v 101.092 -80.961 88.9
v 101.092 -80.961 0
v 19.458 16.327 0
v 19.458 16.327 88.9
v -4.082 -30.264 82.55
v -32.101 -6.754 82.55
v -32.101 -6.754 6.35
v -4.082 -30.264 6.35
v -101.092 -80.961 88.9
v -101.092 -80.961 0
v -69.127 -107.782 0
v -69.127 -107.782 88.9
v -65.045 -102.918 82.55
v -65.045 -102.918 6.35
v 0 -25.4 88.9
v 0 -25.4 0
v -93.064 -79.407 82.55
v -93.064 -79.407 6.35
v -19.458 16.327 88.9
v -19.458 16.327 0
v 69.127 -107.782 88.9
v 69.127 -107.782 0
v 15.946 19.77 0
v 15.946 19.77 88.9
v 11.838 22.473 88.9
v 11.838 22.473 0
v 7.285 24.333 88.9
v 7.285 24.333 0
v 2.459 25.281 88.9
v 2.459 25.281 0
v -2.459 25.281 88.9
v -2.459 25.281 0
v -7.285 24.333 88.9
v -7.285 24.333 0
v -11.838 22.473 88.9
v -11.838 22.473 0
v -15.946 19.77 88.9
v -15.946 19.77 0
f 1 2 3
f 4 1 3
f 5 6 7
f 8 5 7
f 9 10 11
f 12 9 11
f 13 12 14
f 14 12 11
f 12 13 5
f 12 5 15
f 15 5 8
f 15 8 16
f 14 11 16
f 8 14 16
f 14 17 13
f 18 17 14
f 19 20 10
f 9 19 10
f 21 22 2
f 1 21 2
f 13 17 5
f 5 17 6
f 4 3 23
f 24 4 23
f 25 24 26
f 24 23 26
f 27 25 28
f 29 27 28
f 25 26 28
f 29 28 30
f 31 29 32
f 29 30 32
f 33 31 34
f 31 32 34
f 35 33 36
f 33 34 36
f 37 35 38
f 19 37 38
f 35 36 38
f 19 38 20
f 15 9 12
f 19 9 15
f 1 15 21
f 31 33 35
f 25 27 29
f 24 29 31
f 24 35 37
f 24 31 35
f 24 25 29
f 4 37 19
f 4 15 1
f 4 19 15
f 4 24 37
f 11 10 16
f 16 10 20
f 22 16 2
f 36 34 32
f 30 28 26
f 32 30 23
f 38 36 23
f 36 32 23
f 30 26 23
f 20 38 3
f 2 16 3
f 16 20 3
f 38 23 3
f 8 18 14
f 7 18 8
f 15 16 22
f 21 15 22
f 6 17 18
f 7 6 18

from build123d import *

# Parameters (mm, degrees)
BOSS_EXTRUDE1_DEPTH     = 88.9
CUT_EXTRUDE1_DEPTH      = 3.048
CUT_EXTRUDE1_DEPTH_BACK = 36.576
SKETCH3_W               = 76.2
SKETCH3_H               = 94.842471145


with BuildPart() as part:
    # Sketch1 → Boss-Extrude1 (new body)
    with BuildSketch(Plane.XY):
        with BuildLine():
            ThreePointArc((25.4, 0), (17.960512242, -17.960512242), (0, -25.4))
            Line((0, -25.4), (69.126967967, -107.78231242))
            Line((69.126967967, -107.78231242), (101.091555285, -80.96083899))
            Line((101.091555285, -80.96083899), (19.457528855, 16.326805286))
            ThreePointArc((19.457528855, 16.326805286), (23.868192568, 8.68731164), (25.4, 0))
        make_face()
        with BuildLine():
            ThreePointArc((19.457528855, 16.326805286), (0, 25.4), (-19.457528855, 16.326805286))
            Line((-19.457528855, 16.326805286), (0, 0))
            Line((0, 0), (19.457528855, 16.326805286))
        make_face()
        with BuildLine():
            Line((12.507058463, -10.494668144), (0, -25.4))
            ThreePointArc((0, -25.4), (17.960512242, -17.960512242), (25.4, 0))
            ThreePointArc((25.4, 0), (23.868192568, 8.68731164), (19.457528855, 16.326805286))
            Line((19.457528855, 16.326805286), (0, 0))
            Line((0, 0), (12.507058463, -10.494668144))
        make_face()
        Polygon((-12.507058463, -10.494668144), (0, -25.4), (12.507058463, -10.494668144), (0, 0), align=None)
        with BuildLine():
            ThreePointArc((-19.457528855, 16.326805286), (-23.020217791, -10.734503848), (0, -25.4))
            Line((0, -25.4), (-12.507058463, -10.494668144))
            Line((-12.507058463, -10.494668144), (0, 0))
            Line((0, 0), (-19.457528855, 16.326805286))
        make_face()
        with BuildLine():
            Line((-69.126967967, -107.78231242), (0, -25.4))
            ThreePointArc((0, -25.4), (-23.020217791, -10.734503848), (-19.457528855, 16.326805286))
            Line((-19.457528855, 16.326805286), (-101.091555285, -80.96083899))
            Line((-101.091555285, -80.96083899), (-69.126967967, -107.78231242))
        make_face()
    extrude(amount=BOSS_EXTRUDE1_DEPTH)

    # Sketch3 → Cut-Extrude1 (cut, two sides: drawn at the far end of the back side and taken through both)
    with BuildSketch(Plane(origin=(12.507058463, -10.494668144, 0), x_dir=(0, 0, -1), z_dir=(0.7660444431189793, -0.6427876096865378, 0)).offset(-CUT_EXTRUDE1_DEPTH_BACK)):
        with Locations((-44.45, -73.228764428)):
            Rectangle(SKETCH3_W, SKETCH3_H)
    extrude(amount=CUT_EXTRUDE1_DEPTH + CUT_EXTRUDE1_DEPTH_BACK, mode=Mode.SUBTRACT)


solid = part.part
